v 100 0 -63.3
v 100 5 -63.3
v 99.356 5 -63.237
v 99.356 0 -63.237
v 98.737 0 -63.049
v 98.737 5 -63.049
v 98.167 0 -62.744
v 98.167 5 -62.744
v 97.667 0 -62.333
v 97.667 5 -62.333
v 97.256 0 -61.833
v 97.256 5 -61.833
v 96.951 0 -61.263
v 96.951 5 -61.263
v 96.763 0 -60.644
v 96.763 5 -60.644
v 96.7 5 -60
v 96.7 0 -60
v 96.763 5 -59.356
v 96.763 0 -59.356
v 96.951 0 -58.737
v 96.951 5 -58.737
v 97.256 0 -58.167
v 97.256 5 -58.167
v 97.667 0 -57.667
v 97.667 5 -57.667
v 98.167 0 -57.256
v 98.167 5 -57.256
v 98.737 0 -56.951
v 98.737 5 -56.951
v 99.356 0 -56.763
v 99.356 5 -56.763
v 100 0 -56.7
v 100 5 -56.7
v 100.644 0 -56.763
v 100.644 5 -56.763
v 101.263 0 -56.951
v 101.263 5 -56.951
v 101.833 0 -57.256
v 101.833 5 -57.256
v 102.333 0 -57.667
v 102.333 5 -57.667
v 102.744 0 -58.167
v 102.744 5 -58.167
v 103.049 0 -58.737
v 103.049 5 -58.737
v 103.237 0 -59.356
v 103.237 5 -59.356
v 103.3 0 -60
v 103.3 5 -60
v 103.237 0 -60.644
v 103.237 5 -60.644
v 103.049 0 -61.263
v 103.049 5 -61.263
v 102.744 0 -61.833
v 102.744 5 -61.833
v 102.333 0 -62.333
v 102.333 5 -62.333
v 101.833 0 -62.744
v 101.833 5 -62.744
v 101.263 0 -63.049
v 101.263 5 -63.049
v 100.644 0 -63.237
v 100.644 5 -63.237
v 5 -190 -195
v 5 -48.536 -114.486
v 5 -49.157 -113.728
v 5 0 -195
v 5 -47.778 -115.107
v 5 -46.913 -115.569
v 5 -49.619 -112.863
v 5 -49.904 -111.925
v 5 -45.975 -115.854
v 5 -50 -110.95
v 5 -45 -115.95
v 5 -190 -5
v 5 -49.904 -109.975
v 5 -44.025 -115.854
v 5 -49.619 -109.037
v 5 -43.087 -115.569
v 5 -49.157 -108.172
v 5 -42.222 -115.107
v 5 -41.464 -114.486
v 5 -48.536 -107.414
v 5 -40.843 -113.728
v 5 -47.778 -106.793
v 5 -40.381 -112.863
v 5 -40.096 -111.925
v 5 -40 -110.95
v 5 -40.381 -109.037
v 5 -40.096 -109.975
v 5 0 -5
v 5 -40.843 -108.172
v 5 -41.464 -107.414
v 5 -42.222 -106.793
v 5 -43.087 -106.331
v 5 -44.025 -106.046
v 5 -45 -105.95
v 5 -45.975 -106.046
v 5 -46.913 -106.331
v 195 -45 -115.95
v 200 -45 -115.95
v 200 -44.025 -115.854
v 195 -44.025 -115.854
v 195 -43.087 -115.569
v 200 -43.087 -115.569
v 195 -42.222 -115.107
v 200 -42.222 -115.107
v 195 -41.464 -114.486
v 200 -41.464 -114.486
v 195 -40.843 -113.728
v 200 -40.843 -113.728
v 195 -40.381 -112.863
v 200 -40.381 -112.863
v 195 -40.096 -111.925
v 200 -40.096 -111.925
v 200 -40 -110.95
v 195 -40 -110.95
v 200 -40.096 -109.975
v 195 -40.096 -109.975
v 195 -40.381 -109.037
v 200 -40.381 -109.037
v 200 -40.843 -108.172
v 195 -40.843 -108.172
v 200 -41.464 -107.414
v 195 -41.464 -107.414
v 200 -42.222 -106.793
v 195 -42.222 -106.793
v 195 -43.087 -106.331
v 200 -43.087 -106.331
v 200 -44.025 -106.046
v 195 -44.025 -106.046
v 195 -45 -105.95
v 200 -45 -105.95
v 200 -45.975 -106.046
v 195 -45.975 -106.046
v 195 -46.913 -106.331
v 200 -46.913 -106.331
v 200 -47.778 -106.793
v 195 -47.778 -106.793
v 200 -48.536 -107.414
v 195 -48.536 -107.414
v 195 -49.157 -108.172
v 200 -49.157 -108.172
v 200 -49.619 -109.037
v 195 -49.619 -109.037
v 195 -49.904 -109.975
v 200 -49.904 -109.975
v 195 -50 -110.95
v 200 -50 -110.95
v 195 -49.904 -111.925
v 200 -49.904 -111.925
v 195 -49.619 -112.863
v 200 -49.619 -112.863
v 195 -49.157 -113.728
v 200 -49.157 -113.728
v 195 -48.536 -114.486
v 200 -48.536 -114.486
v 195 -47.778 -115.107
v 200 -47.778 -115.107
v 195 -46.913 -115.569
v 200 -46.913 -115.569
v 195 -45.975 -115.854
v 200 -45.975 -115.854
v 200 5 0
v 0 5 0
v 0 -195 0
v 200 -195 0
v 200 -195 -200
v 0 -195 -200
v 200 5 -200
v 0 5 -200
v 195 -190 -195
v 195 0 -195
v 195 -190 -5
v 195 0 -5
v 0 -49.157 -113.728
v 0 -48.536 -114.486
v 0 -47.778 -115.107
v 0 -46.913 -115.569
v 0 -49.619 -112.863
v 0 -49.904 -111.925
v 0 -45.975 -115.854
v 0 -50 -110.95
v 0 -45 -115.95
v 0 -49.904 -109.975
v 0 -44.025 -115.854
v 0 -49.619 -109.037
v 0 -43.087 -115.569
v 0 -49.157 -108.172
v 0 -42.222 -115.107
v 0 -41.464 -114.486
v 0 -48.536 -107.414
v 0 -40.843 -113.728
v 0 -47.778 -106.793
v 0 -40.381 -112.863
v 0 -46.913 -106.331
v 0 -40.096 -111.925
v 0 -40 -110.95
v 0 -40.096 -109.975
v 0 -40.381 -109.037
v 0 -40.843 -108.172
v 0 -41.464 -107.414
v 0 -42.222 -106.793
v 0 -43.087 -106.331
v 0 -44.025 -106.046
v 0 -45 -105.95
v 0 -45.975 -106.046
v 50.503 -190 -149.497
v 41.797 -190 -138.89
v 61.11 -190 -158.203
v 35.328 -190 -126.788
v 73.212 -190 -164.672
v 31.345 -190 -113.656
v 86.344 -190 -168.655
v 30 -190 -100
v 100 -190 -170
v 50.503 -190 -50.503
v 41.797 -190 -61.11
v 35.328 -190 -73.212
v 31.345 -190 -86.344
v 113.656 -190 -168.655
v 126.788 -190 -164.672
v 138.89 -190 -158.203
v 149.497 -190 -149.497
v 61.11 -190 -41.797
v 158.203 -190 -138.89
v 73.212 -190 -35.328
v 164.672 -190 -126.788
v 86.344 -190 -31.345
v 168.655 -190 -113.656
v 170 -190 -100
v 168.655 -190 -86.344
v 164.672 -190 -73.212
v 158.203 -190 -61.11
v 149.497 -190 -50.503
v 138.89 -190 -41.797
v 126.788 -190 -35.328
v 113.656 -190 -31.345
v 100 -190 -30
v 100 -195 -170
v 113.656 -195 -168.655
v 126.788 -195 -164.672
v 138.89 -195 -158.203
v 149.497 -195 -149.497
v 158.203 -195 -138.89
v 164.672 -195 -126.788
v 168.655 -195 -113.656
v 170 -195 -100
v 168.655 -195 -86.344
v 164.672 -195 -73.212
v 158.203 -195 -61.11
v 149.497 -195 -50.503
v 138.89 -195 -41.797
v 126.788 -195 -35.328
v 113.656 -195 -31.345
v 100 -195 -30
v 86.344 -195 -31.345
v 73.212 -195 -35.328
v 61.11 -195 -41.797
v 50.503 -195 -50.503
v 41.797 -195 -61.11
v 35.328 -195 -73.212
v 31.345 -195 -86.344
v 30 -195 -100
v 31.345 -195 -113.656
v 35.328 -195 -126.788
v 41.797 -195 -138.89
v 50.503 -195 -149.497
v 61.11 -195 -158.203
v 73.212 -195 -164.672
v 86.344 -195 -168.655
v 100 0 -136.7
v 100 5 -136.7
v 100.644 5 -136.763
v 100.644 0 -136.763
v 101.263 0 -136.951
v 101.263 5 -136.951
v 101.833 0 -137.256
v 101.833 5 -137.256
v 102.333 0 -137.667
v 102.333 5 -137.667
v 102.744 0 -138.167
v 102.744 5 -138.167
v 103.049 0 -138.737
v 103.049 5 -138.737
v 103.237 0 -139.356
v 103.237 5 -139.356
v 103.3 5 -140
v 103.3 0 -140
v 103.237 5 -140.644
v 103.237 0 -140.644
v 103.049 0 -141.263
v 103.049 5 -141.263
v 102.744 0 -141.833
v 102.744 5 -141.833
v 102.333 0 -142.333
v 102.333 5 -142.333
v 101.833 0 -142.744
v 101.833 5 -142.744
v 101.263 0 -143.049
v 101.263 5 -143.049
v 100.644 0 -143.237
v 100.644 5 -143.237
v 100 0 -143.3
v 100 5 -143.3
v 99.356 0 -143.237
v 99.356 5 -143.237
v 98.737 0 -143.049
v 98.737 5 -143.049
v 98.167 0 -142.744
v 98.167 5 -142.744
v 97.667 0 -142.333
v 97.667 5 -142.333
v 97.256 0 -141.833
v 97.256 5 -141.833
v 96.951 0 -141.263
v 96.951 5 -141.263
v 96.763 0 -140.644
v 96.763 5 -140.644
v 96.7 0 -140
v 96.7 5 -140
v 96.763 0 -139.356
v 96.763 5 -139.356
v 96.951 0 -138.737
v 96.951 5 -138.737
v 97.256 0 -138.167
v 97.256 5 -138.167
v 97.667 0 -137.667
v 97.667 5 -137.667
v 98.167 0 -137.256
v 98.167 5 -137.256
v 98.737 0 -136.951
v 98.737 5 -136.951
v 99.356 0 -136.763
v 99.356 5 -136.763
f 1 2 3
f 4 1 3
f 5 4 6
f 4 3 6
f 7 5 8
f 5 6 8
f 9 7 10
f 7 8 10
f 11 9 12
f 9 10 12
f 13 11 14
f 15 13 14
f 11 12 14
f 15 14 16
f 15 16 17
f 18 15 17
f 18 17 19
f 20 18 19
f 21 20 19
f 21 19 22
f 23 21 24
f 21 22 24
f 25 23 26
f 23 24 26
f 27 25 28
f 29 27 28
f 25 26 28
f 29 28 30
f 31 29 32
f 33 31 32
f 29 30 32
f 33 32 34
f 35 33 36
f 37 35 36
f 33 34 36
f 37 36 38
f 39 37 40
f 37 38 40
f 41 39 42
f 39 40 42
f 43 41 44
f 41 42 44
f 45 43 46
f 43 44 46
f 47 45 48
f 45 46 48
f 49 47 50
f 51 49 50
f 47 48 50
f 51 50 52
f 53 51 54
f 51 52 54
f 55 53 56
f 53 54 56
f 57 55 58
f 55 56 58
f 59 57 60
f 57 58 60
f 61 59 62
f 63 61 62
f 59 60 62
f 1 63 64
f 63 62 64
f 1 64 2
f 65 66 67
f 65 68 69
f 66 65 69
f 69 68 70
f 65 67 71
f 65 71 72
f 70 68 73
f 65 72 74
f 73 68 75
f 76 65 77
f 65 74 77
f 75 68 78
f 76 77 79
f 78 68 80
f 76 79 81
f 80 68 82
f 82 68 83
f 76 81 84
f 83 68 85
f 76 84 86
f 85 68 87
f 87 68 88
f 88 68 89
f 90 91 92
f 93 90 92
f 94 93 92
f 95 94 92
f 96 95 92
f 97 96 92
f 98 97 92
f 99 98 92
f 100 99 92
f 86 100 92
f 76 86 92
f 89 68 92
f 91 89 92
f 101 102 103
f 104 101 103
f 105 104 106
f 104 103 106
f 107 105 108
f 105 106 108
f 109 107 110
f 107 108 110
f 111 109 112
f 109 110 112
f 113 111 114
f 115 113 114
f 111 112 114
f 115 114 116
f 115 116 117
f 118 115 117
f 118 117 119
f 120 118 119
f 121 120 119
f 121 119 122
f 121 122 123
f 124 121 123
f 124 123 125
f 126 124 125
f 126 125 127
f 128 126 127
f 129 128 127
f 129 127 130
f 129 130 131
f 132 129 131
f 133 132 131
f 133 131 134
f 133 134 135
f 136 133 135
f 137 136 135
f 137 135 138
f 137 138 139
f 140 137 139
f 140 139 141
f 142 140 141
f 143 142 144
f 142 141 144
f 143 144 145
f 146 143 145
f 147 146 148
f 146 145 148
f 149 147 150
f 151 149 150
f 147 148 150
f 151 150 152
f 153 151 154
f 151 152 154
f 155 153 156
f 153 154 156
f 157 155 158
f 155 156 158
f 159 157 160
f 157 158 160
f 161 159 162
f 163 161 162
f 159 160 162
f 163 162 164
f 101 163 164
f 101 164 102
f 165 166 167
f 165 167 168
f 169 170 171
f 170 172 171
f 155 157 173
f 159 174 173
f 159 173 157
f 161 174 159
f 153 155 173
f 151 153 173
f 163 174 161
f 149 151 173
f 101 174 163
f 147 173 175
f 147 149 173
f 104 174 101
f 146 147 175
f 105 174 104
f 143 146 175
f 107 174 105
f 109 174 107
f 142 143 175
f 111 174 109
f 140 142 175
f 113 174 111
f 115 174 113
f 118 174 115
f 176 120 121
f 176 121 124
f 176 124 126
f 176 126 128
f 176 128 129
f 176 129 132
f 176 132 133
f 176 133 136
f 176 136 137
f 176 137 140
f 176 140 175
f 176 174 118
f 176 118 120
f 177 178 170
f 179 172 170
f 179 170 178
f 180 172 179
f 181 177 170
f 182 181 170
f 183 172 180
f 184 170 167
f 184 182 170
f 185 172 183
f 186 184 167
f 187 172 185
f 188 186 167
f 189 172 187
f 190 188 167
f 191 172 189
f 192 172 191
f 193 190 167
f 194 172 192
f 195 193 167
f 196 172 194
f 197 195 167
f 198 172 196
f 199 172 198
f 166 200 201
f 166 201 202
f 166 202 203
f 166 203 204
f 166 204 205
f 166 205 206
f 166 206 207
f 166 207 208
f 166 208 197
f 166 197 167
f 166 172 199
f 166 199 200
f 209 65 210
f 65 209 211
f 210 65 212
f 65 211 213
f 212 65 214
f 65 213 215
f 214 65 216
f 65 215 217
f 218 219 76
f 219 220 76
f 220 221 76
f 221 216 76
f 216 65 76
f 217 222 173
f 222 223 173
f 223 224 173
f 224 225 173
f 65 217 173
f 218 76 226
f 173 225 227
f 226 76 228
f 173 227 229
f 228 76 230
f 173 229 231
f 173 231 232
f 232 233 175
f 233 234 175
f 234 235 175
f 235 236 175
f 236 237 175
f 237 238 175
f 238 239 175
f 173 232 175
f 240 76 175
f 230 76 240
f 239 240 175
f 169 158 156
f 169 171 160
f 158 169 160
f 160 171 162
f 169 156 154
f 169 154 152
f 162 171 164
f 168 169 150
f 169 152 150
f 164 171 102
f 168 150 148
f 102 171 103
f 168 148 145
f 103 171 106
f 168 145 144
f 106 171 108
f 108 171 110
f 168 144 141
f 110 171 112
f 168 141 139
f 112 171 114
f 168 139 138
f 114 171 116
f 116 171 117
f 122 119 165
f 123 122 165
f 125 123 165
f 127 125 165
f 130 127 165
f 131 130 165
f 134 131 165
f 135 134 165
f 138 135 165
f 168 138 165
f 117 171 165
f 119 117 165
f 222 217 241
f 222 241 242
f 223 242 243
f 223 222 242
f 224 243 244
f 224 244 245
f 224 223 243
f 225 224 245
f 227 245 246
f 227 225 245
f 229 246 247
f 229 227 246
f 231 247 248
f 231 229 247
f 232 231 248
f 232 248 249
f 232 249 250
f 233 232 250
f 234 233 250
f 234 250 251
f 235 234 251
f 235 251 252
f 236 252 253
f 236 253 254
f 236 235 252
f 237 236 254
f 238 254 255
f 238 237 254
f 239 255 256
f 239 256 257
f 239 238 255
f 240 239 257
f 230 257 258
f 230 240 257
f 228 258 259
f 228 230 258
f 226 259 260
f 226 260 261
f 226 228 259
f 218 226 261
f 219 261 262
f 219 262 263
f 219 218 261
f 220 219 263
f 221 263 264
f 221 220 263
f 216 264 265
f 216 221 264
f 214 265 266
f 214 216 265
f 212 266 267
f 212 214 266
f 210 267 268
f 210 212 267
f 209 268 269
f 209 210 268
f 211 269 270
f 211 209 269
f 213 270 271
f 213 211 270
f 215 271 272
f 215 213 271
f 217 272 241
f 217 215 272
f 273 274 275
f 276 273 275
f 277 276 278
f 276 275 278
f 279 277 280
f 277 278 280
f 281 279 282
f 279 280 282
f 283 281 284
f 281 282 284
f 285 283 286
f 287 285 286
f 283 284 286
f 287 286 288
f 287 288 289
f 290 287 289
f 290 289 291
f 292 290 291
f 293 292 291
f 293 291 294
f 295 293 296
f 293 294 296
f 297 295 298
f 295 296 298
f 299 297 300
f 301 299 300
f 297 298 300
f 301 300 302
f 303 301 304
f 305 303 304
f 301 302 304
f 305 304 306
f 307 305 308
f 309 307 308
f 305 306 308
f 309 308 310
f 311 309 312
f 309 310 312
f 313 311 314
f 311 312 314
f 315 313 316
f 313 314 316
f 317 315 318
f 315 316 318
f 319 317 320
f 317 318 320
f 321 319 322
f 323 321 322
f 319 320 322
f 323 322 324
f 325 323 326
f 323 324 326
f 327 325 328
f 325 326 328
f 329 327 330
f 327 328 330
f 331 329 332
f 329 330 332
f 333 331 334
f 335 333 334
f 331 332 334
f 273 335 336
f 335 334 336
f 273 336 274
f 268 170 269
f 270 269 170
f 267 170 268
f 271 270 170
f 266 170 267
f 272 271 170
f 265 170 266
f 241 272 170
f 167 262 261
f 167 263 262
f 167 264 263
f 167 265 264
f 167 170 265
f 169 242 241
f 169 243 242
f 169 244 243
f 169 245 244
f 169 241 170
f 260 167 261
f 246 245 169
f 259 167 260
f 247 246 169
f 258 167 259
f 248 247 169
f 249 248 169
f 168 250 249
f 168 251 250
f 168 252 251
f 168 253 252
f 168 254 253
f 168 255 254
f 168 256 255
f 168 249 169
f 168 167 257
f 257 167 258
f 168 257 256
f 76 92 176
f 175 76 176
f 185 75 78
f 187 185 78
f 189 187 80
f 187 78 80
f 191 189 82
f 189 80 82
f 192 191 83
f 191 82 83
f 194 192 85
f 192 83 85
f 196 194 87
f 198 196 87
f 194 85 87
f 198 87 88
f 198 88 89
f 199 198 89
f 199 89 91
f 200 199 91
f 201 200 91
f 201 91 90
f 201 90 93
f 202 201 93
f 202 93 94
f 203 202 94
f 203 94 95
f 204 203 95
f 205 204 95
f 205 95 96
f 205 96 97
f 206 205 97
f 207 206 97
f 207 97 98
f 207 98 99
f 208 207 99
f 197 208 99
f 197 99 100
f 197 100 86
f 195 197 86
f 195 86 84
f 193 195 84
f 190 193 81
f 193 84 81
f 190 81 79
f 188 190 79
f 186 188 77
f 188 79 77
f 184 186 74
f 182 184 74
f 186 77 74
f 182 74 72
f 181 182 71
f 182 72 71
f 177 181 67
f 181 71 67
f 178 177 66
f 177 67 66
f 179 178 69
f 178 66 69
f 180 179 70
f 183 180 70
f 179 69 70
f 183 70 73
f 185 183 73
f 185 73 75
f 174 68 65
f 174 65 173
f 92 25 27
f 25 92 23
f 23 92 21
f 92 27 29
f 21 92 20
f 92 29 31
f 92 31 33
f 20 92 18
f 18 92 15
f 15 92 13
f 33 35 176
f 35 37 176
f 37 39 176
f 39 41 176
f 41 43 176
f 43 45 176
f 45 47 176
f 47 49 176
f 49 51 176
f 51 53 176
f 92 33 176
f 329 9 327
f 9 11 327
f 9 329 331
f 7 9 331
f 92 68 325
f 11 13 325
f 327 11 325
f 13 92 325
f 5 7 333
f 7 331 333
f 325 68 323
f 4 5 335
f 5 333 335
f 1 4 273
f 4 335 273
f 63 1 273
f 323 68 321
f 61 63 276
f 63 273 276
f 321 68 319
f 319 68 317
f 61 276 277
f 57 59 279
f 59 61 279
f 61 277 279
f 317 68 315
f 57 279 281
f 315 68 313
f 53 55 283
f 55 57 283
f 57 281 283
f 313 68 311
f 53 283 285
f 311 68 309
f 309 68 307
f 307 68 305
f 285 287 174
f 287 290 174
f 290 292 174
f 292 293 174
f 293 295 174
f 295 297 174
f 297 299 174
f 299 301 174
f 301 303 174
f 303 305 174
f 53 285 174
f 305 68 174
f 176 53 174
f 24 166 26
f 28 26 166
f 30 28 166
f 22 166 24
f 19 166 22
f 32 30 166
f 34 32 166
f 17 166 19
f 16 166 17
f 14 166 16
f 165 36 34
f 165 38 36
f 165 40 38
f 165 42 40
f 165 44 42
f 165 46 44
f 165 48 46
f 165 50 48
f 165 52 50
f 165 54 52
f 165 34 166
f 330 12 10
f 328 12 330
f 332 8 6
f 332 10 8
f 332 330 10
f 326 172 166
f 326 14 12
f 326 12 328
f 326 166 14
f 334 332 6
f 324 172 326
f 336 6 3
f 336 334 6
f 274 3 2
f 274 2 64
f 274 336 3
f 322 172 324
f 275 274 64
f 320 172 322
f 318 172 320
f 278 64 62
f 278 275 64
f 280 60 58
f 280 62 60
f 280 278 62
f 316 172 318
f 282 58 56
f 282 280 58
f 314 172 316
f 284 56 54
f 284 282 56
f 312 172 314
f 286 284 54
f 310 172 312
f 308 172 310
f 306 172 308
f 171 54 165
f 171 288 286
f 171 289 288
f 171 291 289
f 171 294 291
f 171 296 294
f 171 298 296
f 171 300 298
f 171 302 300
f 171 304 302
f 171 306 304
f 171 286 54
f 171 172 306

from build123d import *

# Parameters (mm, degrees)
SKETCH_1_W          = 200
SKETCH_1_H          = 200
EXTRUDE_1_DEPTH     = 5
SKETCH_3_W          = 200
SKETCH_3_H          = 200
SKETCH_3_W_2        = 190
SKETCH_3_H_2        = 190
EXTRUDE_2_DEPTH     = 190
SKETCH_4_W          = 200
SKETCH_4_H          = 200
SKETCH_4_R          = 70
EXTRUDE_3_DEPTH     = 5
SKETCH_5_R          = 3.3
CUT_EXTRUDE_1_DEPTH = 5
SKETCH_7_R          = 5
CUT_EXTRUDE_2_DEPTH = 344.547667726


with BuildPart() as part:
    # 草图1 → 凸台-拉伸1 (new body)
    with BuildSketch(Plane(origin=(0, 0, 0), x_dir=(1, 0, 0), z_dir=(0, 1, 0))):
        with Locations((100, 100)):
            Rectangle(SKETCH_1_W, SKETCH_1_H)
    extrude(amount=EXTRUDE_1_DEPTH)

    # 草图3 → 凸台-拉伸2 (add)
    with BuildSketch(Plane.XZ):
        with Locations((100, -100)):
            Rectangle(SKETCH_3_W, SKETCH_3_H)
        with Locations((100, -100)):
            Rectangle(SKETCH_3_W_2, SKETCH_3_H_2, mode=Mode.SUBTRACT)
    extrude(amount=EXTRUDE_2_DEPTH)

    # 草图4 → 凸台-拉伸3 (add)
    with BuildSketch(Plane.XZ.offset(190)):
        with Locations((100, -100)):
            Rectangle(SKETCH_4_W, SKETCH_4_H)
        with Locations(Location((100, -100, 0), (0, 0, 270))):
            Circle(SKETCH_4_R, mode=Mode.SUBTRACT)
    extrude(amount=EXTRUDE_3_DEPTH)

    # 草图5 → 切除-拉伸1 (cut)
    with BuildSketch(Plane(origin=(0, 5, 0), x_dir=(1, 0, 0), z_dir=(0, 1, 0))):
        with Locations(Location((100, 140, 0), (0, 0, 270))):
            Circle(SKETCH_5_R)
        with Locations(Location((100, 60, 0), (0, 0, 90))):
            Circle(SKETCH_5_R)
    extrude(amount=-CUT_EXTRUDE_1_DEPTH, mode=Mode.SUBTRACT)

    # 草图7 → 切除-拉伸2 (cut, through all)
    with BuildSketch(Plane(origin=(200, 0, 0), x_dir=(0, 0, -1), z_dir=(1, 0, 0))):
        with Locations((110.95, -45)):
            Circle(SKETCH_7_R)
    extrude(amount=-CUT_EXTRUDE_2_DEPTH, mode=Mode.SUBTRACT)


solid = part.part
